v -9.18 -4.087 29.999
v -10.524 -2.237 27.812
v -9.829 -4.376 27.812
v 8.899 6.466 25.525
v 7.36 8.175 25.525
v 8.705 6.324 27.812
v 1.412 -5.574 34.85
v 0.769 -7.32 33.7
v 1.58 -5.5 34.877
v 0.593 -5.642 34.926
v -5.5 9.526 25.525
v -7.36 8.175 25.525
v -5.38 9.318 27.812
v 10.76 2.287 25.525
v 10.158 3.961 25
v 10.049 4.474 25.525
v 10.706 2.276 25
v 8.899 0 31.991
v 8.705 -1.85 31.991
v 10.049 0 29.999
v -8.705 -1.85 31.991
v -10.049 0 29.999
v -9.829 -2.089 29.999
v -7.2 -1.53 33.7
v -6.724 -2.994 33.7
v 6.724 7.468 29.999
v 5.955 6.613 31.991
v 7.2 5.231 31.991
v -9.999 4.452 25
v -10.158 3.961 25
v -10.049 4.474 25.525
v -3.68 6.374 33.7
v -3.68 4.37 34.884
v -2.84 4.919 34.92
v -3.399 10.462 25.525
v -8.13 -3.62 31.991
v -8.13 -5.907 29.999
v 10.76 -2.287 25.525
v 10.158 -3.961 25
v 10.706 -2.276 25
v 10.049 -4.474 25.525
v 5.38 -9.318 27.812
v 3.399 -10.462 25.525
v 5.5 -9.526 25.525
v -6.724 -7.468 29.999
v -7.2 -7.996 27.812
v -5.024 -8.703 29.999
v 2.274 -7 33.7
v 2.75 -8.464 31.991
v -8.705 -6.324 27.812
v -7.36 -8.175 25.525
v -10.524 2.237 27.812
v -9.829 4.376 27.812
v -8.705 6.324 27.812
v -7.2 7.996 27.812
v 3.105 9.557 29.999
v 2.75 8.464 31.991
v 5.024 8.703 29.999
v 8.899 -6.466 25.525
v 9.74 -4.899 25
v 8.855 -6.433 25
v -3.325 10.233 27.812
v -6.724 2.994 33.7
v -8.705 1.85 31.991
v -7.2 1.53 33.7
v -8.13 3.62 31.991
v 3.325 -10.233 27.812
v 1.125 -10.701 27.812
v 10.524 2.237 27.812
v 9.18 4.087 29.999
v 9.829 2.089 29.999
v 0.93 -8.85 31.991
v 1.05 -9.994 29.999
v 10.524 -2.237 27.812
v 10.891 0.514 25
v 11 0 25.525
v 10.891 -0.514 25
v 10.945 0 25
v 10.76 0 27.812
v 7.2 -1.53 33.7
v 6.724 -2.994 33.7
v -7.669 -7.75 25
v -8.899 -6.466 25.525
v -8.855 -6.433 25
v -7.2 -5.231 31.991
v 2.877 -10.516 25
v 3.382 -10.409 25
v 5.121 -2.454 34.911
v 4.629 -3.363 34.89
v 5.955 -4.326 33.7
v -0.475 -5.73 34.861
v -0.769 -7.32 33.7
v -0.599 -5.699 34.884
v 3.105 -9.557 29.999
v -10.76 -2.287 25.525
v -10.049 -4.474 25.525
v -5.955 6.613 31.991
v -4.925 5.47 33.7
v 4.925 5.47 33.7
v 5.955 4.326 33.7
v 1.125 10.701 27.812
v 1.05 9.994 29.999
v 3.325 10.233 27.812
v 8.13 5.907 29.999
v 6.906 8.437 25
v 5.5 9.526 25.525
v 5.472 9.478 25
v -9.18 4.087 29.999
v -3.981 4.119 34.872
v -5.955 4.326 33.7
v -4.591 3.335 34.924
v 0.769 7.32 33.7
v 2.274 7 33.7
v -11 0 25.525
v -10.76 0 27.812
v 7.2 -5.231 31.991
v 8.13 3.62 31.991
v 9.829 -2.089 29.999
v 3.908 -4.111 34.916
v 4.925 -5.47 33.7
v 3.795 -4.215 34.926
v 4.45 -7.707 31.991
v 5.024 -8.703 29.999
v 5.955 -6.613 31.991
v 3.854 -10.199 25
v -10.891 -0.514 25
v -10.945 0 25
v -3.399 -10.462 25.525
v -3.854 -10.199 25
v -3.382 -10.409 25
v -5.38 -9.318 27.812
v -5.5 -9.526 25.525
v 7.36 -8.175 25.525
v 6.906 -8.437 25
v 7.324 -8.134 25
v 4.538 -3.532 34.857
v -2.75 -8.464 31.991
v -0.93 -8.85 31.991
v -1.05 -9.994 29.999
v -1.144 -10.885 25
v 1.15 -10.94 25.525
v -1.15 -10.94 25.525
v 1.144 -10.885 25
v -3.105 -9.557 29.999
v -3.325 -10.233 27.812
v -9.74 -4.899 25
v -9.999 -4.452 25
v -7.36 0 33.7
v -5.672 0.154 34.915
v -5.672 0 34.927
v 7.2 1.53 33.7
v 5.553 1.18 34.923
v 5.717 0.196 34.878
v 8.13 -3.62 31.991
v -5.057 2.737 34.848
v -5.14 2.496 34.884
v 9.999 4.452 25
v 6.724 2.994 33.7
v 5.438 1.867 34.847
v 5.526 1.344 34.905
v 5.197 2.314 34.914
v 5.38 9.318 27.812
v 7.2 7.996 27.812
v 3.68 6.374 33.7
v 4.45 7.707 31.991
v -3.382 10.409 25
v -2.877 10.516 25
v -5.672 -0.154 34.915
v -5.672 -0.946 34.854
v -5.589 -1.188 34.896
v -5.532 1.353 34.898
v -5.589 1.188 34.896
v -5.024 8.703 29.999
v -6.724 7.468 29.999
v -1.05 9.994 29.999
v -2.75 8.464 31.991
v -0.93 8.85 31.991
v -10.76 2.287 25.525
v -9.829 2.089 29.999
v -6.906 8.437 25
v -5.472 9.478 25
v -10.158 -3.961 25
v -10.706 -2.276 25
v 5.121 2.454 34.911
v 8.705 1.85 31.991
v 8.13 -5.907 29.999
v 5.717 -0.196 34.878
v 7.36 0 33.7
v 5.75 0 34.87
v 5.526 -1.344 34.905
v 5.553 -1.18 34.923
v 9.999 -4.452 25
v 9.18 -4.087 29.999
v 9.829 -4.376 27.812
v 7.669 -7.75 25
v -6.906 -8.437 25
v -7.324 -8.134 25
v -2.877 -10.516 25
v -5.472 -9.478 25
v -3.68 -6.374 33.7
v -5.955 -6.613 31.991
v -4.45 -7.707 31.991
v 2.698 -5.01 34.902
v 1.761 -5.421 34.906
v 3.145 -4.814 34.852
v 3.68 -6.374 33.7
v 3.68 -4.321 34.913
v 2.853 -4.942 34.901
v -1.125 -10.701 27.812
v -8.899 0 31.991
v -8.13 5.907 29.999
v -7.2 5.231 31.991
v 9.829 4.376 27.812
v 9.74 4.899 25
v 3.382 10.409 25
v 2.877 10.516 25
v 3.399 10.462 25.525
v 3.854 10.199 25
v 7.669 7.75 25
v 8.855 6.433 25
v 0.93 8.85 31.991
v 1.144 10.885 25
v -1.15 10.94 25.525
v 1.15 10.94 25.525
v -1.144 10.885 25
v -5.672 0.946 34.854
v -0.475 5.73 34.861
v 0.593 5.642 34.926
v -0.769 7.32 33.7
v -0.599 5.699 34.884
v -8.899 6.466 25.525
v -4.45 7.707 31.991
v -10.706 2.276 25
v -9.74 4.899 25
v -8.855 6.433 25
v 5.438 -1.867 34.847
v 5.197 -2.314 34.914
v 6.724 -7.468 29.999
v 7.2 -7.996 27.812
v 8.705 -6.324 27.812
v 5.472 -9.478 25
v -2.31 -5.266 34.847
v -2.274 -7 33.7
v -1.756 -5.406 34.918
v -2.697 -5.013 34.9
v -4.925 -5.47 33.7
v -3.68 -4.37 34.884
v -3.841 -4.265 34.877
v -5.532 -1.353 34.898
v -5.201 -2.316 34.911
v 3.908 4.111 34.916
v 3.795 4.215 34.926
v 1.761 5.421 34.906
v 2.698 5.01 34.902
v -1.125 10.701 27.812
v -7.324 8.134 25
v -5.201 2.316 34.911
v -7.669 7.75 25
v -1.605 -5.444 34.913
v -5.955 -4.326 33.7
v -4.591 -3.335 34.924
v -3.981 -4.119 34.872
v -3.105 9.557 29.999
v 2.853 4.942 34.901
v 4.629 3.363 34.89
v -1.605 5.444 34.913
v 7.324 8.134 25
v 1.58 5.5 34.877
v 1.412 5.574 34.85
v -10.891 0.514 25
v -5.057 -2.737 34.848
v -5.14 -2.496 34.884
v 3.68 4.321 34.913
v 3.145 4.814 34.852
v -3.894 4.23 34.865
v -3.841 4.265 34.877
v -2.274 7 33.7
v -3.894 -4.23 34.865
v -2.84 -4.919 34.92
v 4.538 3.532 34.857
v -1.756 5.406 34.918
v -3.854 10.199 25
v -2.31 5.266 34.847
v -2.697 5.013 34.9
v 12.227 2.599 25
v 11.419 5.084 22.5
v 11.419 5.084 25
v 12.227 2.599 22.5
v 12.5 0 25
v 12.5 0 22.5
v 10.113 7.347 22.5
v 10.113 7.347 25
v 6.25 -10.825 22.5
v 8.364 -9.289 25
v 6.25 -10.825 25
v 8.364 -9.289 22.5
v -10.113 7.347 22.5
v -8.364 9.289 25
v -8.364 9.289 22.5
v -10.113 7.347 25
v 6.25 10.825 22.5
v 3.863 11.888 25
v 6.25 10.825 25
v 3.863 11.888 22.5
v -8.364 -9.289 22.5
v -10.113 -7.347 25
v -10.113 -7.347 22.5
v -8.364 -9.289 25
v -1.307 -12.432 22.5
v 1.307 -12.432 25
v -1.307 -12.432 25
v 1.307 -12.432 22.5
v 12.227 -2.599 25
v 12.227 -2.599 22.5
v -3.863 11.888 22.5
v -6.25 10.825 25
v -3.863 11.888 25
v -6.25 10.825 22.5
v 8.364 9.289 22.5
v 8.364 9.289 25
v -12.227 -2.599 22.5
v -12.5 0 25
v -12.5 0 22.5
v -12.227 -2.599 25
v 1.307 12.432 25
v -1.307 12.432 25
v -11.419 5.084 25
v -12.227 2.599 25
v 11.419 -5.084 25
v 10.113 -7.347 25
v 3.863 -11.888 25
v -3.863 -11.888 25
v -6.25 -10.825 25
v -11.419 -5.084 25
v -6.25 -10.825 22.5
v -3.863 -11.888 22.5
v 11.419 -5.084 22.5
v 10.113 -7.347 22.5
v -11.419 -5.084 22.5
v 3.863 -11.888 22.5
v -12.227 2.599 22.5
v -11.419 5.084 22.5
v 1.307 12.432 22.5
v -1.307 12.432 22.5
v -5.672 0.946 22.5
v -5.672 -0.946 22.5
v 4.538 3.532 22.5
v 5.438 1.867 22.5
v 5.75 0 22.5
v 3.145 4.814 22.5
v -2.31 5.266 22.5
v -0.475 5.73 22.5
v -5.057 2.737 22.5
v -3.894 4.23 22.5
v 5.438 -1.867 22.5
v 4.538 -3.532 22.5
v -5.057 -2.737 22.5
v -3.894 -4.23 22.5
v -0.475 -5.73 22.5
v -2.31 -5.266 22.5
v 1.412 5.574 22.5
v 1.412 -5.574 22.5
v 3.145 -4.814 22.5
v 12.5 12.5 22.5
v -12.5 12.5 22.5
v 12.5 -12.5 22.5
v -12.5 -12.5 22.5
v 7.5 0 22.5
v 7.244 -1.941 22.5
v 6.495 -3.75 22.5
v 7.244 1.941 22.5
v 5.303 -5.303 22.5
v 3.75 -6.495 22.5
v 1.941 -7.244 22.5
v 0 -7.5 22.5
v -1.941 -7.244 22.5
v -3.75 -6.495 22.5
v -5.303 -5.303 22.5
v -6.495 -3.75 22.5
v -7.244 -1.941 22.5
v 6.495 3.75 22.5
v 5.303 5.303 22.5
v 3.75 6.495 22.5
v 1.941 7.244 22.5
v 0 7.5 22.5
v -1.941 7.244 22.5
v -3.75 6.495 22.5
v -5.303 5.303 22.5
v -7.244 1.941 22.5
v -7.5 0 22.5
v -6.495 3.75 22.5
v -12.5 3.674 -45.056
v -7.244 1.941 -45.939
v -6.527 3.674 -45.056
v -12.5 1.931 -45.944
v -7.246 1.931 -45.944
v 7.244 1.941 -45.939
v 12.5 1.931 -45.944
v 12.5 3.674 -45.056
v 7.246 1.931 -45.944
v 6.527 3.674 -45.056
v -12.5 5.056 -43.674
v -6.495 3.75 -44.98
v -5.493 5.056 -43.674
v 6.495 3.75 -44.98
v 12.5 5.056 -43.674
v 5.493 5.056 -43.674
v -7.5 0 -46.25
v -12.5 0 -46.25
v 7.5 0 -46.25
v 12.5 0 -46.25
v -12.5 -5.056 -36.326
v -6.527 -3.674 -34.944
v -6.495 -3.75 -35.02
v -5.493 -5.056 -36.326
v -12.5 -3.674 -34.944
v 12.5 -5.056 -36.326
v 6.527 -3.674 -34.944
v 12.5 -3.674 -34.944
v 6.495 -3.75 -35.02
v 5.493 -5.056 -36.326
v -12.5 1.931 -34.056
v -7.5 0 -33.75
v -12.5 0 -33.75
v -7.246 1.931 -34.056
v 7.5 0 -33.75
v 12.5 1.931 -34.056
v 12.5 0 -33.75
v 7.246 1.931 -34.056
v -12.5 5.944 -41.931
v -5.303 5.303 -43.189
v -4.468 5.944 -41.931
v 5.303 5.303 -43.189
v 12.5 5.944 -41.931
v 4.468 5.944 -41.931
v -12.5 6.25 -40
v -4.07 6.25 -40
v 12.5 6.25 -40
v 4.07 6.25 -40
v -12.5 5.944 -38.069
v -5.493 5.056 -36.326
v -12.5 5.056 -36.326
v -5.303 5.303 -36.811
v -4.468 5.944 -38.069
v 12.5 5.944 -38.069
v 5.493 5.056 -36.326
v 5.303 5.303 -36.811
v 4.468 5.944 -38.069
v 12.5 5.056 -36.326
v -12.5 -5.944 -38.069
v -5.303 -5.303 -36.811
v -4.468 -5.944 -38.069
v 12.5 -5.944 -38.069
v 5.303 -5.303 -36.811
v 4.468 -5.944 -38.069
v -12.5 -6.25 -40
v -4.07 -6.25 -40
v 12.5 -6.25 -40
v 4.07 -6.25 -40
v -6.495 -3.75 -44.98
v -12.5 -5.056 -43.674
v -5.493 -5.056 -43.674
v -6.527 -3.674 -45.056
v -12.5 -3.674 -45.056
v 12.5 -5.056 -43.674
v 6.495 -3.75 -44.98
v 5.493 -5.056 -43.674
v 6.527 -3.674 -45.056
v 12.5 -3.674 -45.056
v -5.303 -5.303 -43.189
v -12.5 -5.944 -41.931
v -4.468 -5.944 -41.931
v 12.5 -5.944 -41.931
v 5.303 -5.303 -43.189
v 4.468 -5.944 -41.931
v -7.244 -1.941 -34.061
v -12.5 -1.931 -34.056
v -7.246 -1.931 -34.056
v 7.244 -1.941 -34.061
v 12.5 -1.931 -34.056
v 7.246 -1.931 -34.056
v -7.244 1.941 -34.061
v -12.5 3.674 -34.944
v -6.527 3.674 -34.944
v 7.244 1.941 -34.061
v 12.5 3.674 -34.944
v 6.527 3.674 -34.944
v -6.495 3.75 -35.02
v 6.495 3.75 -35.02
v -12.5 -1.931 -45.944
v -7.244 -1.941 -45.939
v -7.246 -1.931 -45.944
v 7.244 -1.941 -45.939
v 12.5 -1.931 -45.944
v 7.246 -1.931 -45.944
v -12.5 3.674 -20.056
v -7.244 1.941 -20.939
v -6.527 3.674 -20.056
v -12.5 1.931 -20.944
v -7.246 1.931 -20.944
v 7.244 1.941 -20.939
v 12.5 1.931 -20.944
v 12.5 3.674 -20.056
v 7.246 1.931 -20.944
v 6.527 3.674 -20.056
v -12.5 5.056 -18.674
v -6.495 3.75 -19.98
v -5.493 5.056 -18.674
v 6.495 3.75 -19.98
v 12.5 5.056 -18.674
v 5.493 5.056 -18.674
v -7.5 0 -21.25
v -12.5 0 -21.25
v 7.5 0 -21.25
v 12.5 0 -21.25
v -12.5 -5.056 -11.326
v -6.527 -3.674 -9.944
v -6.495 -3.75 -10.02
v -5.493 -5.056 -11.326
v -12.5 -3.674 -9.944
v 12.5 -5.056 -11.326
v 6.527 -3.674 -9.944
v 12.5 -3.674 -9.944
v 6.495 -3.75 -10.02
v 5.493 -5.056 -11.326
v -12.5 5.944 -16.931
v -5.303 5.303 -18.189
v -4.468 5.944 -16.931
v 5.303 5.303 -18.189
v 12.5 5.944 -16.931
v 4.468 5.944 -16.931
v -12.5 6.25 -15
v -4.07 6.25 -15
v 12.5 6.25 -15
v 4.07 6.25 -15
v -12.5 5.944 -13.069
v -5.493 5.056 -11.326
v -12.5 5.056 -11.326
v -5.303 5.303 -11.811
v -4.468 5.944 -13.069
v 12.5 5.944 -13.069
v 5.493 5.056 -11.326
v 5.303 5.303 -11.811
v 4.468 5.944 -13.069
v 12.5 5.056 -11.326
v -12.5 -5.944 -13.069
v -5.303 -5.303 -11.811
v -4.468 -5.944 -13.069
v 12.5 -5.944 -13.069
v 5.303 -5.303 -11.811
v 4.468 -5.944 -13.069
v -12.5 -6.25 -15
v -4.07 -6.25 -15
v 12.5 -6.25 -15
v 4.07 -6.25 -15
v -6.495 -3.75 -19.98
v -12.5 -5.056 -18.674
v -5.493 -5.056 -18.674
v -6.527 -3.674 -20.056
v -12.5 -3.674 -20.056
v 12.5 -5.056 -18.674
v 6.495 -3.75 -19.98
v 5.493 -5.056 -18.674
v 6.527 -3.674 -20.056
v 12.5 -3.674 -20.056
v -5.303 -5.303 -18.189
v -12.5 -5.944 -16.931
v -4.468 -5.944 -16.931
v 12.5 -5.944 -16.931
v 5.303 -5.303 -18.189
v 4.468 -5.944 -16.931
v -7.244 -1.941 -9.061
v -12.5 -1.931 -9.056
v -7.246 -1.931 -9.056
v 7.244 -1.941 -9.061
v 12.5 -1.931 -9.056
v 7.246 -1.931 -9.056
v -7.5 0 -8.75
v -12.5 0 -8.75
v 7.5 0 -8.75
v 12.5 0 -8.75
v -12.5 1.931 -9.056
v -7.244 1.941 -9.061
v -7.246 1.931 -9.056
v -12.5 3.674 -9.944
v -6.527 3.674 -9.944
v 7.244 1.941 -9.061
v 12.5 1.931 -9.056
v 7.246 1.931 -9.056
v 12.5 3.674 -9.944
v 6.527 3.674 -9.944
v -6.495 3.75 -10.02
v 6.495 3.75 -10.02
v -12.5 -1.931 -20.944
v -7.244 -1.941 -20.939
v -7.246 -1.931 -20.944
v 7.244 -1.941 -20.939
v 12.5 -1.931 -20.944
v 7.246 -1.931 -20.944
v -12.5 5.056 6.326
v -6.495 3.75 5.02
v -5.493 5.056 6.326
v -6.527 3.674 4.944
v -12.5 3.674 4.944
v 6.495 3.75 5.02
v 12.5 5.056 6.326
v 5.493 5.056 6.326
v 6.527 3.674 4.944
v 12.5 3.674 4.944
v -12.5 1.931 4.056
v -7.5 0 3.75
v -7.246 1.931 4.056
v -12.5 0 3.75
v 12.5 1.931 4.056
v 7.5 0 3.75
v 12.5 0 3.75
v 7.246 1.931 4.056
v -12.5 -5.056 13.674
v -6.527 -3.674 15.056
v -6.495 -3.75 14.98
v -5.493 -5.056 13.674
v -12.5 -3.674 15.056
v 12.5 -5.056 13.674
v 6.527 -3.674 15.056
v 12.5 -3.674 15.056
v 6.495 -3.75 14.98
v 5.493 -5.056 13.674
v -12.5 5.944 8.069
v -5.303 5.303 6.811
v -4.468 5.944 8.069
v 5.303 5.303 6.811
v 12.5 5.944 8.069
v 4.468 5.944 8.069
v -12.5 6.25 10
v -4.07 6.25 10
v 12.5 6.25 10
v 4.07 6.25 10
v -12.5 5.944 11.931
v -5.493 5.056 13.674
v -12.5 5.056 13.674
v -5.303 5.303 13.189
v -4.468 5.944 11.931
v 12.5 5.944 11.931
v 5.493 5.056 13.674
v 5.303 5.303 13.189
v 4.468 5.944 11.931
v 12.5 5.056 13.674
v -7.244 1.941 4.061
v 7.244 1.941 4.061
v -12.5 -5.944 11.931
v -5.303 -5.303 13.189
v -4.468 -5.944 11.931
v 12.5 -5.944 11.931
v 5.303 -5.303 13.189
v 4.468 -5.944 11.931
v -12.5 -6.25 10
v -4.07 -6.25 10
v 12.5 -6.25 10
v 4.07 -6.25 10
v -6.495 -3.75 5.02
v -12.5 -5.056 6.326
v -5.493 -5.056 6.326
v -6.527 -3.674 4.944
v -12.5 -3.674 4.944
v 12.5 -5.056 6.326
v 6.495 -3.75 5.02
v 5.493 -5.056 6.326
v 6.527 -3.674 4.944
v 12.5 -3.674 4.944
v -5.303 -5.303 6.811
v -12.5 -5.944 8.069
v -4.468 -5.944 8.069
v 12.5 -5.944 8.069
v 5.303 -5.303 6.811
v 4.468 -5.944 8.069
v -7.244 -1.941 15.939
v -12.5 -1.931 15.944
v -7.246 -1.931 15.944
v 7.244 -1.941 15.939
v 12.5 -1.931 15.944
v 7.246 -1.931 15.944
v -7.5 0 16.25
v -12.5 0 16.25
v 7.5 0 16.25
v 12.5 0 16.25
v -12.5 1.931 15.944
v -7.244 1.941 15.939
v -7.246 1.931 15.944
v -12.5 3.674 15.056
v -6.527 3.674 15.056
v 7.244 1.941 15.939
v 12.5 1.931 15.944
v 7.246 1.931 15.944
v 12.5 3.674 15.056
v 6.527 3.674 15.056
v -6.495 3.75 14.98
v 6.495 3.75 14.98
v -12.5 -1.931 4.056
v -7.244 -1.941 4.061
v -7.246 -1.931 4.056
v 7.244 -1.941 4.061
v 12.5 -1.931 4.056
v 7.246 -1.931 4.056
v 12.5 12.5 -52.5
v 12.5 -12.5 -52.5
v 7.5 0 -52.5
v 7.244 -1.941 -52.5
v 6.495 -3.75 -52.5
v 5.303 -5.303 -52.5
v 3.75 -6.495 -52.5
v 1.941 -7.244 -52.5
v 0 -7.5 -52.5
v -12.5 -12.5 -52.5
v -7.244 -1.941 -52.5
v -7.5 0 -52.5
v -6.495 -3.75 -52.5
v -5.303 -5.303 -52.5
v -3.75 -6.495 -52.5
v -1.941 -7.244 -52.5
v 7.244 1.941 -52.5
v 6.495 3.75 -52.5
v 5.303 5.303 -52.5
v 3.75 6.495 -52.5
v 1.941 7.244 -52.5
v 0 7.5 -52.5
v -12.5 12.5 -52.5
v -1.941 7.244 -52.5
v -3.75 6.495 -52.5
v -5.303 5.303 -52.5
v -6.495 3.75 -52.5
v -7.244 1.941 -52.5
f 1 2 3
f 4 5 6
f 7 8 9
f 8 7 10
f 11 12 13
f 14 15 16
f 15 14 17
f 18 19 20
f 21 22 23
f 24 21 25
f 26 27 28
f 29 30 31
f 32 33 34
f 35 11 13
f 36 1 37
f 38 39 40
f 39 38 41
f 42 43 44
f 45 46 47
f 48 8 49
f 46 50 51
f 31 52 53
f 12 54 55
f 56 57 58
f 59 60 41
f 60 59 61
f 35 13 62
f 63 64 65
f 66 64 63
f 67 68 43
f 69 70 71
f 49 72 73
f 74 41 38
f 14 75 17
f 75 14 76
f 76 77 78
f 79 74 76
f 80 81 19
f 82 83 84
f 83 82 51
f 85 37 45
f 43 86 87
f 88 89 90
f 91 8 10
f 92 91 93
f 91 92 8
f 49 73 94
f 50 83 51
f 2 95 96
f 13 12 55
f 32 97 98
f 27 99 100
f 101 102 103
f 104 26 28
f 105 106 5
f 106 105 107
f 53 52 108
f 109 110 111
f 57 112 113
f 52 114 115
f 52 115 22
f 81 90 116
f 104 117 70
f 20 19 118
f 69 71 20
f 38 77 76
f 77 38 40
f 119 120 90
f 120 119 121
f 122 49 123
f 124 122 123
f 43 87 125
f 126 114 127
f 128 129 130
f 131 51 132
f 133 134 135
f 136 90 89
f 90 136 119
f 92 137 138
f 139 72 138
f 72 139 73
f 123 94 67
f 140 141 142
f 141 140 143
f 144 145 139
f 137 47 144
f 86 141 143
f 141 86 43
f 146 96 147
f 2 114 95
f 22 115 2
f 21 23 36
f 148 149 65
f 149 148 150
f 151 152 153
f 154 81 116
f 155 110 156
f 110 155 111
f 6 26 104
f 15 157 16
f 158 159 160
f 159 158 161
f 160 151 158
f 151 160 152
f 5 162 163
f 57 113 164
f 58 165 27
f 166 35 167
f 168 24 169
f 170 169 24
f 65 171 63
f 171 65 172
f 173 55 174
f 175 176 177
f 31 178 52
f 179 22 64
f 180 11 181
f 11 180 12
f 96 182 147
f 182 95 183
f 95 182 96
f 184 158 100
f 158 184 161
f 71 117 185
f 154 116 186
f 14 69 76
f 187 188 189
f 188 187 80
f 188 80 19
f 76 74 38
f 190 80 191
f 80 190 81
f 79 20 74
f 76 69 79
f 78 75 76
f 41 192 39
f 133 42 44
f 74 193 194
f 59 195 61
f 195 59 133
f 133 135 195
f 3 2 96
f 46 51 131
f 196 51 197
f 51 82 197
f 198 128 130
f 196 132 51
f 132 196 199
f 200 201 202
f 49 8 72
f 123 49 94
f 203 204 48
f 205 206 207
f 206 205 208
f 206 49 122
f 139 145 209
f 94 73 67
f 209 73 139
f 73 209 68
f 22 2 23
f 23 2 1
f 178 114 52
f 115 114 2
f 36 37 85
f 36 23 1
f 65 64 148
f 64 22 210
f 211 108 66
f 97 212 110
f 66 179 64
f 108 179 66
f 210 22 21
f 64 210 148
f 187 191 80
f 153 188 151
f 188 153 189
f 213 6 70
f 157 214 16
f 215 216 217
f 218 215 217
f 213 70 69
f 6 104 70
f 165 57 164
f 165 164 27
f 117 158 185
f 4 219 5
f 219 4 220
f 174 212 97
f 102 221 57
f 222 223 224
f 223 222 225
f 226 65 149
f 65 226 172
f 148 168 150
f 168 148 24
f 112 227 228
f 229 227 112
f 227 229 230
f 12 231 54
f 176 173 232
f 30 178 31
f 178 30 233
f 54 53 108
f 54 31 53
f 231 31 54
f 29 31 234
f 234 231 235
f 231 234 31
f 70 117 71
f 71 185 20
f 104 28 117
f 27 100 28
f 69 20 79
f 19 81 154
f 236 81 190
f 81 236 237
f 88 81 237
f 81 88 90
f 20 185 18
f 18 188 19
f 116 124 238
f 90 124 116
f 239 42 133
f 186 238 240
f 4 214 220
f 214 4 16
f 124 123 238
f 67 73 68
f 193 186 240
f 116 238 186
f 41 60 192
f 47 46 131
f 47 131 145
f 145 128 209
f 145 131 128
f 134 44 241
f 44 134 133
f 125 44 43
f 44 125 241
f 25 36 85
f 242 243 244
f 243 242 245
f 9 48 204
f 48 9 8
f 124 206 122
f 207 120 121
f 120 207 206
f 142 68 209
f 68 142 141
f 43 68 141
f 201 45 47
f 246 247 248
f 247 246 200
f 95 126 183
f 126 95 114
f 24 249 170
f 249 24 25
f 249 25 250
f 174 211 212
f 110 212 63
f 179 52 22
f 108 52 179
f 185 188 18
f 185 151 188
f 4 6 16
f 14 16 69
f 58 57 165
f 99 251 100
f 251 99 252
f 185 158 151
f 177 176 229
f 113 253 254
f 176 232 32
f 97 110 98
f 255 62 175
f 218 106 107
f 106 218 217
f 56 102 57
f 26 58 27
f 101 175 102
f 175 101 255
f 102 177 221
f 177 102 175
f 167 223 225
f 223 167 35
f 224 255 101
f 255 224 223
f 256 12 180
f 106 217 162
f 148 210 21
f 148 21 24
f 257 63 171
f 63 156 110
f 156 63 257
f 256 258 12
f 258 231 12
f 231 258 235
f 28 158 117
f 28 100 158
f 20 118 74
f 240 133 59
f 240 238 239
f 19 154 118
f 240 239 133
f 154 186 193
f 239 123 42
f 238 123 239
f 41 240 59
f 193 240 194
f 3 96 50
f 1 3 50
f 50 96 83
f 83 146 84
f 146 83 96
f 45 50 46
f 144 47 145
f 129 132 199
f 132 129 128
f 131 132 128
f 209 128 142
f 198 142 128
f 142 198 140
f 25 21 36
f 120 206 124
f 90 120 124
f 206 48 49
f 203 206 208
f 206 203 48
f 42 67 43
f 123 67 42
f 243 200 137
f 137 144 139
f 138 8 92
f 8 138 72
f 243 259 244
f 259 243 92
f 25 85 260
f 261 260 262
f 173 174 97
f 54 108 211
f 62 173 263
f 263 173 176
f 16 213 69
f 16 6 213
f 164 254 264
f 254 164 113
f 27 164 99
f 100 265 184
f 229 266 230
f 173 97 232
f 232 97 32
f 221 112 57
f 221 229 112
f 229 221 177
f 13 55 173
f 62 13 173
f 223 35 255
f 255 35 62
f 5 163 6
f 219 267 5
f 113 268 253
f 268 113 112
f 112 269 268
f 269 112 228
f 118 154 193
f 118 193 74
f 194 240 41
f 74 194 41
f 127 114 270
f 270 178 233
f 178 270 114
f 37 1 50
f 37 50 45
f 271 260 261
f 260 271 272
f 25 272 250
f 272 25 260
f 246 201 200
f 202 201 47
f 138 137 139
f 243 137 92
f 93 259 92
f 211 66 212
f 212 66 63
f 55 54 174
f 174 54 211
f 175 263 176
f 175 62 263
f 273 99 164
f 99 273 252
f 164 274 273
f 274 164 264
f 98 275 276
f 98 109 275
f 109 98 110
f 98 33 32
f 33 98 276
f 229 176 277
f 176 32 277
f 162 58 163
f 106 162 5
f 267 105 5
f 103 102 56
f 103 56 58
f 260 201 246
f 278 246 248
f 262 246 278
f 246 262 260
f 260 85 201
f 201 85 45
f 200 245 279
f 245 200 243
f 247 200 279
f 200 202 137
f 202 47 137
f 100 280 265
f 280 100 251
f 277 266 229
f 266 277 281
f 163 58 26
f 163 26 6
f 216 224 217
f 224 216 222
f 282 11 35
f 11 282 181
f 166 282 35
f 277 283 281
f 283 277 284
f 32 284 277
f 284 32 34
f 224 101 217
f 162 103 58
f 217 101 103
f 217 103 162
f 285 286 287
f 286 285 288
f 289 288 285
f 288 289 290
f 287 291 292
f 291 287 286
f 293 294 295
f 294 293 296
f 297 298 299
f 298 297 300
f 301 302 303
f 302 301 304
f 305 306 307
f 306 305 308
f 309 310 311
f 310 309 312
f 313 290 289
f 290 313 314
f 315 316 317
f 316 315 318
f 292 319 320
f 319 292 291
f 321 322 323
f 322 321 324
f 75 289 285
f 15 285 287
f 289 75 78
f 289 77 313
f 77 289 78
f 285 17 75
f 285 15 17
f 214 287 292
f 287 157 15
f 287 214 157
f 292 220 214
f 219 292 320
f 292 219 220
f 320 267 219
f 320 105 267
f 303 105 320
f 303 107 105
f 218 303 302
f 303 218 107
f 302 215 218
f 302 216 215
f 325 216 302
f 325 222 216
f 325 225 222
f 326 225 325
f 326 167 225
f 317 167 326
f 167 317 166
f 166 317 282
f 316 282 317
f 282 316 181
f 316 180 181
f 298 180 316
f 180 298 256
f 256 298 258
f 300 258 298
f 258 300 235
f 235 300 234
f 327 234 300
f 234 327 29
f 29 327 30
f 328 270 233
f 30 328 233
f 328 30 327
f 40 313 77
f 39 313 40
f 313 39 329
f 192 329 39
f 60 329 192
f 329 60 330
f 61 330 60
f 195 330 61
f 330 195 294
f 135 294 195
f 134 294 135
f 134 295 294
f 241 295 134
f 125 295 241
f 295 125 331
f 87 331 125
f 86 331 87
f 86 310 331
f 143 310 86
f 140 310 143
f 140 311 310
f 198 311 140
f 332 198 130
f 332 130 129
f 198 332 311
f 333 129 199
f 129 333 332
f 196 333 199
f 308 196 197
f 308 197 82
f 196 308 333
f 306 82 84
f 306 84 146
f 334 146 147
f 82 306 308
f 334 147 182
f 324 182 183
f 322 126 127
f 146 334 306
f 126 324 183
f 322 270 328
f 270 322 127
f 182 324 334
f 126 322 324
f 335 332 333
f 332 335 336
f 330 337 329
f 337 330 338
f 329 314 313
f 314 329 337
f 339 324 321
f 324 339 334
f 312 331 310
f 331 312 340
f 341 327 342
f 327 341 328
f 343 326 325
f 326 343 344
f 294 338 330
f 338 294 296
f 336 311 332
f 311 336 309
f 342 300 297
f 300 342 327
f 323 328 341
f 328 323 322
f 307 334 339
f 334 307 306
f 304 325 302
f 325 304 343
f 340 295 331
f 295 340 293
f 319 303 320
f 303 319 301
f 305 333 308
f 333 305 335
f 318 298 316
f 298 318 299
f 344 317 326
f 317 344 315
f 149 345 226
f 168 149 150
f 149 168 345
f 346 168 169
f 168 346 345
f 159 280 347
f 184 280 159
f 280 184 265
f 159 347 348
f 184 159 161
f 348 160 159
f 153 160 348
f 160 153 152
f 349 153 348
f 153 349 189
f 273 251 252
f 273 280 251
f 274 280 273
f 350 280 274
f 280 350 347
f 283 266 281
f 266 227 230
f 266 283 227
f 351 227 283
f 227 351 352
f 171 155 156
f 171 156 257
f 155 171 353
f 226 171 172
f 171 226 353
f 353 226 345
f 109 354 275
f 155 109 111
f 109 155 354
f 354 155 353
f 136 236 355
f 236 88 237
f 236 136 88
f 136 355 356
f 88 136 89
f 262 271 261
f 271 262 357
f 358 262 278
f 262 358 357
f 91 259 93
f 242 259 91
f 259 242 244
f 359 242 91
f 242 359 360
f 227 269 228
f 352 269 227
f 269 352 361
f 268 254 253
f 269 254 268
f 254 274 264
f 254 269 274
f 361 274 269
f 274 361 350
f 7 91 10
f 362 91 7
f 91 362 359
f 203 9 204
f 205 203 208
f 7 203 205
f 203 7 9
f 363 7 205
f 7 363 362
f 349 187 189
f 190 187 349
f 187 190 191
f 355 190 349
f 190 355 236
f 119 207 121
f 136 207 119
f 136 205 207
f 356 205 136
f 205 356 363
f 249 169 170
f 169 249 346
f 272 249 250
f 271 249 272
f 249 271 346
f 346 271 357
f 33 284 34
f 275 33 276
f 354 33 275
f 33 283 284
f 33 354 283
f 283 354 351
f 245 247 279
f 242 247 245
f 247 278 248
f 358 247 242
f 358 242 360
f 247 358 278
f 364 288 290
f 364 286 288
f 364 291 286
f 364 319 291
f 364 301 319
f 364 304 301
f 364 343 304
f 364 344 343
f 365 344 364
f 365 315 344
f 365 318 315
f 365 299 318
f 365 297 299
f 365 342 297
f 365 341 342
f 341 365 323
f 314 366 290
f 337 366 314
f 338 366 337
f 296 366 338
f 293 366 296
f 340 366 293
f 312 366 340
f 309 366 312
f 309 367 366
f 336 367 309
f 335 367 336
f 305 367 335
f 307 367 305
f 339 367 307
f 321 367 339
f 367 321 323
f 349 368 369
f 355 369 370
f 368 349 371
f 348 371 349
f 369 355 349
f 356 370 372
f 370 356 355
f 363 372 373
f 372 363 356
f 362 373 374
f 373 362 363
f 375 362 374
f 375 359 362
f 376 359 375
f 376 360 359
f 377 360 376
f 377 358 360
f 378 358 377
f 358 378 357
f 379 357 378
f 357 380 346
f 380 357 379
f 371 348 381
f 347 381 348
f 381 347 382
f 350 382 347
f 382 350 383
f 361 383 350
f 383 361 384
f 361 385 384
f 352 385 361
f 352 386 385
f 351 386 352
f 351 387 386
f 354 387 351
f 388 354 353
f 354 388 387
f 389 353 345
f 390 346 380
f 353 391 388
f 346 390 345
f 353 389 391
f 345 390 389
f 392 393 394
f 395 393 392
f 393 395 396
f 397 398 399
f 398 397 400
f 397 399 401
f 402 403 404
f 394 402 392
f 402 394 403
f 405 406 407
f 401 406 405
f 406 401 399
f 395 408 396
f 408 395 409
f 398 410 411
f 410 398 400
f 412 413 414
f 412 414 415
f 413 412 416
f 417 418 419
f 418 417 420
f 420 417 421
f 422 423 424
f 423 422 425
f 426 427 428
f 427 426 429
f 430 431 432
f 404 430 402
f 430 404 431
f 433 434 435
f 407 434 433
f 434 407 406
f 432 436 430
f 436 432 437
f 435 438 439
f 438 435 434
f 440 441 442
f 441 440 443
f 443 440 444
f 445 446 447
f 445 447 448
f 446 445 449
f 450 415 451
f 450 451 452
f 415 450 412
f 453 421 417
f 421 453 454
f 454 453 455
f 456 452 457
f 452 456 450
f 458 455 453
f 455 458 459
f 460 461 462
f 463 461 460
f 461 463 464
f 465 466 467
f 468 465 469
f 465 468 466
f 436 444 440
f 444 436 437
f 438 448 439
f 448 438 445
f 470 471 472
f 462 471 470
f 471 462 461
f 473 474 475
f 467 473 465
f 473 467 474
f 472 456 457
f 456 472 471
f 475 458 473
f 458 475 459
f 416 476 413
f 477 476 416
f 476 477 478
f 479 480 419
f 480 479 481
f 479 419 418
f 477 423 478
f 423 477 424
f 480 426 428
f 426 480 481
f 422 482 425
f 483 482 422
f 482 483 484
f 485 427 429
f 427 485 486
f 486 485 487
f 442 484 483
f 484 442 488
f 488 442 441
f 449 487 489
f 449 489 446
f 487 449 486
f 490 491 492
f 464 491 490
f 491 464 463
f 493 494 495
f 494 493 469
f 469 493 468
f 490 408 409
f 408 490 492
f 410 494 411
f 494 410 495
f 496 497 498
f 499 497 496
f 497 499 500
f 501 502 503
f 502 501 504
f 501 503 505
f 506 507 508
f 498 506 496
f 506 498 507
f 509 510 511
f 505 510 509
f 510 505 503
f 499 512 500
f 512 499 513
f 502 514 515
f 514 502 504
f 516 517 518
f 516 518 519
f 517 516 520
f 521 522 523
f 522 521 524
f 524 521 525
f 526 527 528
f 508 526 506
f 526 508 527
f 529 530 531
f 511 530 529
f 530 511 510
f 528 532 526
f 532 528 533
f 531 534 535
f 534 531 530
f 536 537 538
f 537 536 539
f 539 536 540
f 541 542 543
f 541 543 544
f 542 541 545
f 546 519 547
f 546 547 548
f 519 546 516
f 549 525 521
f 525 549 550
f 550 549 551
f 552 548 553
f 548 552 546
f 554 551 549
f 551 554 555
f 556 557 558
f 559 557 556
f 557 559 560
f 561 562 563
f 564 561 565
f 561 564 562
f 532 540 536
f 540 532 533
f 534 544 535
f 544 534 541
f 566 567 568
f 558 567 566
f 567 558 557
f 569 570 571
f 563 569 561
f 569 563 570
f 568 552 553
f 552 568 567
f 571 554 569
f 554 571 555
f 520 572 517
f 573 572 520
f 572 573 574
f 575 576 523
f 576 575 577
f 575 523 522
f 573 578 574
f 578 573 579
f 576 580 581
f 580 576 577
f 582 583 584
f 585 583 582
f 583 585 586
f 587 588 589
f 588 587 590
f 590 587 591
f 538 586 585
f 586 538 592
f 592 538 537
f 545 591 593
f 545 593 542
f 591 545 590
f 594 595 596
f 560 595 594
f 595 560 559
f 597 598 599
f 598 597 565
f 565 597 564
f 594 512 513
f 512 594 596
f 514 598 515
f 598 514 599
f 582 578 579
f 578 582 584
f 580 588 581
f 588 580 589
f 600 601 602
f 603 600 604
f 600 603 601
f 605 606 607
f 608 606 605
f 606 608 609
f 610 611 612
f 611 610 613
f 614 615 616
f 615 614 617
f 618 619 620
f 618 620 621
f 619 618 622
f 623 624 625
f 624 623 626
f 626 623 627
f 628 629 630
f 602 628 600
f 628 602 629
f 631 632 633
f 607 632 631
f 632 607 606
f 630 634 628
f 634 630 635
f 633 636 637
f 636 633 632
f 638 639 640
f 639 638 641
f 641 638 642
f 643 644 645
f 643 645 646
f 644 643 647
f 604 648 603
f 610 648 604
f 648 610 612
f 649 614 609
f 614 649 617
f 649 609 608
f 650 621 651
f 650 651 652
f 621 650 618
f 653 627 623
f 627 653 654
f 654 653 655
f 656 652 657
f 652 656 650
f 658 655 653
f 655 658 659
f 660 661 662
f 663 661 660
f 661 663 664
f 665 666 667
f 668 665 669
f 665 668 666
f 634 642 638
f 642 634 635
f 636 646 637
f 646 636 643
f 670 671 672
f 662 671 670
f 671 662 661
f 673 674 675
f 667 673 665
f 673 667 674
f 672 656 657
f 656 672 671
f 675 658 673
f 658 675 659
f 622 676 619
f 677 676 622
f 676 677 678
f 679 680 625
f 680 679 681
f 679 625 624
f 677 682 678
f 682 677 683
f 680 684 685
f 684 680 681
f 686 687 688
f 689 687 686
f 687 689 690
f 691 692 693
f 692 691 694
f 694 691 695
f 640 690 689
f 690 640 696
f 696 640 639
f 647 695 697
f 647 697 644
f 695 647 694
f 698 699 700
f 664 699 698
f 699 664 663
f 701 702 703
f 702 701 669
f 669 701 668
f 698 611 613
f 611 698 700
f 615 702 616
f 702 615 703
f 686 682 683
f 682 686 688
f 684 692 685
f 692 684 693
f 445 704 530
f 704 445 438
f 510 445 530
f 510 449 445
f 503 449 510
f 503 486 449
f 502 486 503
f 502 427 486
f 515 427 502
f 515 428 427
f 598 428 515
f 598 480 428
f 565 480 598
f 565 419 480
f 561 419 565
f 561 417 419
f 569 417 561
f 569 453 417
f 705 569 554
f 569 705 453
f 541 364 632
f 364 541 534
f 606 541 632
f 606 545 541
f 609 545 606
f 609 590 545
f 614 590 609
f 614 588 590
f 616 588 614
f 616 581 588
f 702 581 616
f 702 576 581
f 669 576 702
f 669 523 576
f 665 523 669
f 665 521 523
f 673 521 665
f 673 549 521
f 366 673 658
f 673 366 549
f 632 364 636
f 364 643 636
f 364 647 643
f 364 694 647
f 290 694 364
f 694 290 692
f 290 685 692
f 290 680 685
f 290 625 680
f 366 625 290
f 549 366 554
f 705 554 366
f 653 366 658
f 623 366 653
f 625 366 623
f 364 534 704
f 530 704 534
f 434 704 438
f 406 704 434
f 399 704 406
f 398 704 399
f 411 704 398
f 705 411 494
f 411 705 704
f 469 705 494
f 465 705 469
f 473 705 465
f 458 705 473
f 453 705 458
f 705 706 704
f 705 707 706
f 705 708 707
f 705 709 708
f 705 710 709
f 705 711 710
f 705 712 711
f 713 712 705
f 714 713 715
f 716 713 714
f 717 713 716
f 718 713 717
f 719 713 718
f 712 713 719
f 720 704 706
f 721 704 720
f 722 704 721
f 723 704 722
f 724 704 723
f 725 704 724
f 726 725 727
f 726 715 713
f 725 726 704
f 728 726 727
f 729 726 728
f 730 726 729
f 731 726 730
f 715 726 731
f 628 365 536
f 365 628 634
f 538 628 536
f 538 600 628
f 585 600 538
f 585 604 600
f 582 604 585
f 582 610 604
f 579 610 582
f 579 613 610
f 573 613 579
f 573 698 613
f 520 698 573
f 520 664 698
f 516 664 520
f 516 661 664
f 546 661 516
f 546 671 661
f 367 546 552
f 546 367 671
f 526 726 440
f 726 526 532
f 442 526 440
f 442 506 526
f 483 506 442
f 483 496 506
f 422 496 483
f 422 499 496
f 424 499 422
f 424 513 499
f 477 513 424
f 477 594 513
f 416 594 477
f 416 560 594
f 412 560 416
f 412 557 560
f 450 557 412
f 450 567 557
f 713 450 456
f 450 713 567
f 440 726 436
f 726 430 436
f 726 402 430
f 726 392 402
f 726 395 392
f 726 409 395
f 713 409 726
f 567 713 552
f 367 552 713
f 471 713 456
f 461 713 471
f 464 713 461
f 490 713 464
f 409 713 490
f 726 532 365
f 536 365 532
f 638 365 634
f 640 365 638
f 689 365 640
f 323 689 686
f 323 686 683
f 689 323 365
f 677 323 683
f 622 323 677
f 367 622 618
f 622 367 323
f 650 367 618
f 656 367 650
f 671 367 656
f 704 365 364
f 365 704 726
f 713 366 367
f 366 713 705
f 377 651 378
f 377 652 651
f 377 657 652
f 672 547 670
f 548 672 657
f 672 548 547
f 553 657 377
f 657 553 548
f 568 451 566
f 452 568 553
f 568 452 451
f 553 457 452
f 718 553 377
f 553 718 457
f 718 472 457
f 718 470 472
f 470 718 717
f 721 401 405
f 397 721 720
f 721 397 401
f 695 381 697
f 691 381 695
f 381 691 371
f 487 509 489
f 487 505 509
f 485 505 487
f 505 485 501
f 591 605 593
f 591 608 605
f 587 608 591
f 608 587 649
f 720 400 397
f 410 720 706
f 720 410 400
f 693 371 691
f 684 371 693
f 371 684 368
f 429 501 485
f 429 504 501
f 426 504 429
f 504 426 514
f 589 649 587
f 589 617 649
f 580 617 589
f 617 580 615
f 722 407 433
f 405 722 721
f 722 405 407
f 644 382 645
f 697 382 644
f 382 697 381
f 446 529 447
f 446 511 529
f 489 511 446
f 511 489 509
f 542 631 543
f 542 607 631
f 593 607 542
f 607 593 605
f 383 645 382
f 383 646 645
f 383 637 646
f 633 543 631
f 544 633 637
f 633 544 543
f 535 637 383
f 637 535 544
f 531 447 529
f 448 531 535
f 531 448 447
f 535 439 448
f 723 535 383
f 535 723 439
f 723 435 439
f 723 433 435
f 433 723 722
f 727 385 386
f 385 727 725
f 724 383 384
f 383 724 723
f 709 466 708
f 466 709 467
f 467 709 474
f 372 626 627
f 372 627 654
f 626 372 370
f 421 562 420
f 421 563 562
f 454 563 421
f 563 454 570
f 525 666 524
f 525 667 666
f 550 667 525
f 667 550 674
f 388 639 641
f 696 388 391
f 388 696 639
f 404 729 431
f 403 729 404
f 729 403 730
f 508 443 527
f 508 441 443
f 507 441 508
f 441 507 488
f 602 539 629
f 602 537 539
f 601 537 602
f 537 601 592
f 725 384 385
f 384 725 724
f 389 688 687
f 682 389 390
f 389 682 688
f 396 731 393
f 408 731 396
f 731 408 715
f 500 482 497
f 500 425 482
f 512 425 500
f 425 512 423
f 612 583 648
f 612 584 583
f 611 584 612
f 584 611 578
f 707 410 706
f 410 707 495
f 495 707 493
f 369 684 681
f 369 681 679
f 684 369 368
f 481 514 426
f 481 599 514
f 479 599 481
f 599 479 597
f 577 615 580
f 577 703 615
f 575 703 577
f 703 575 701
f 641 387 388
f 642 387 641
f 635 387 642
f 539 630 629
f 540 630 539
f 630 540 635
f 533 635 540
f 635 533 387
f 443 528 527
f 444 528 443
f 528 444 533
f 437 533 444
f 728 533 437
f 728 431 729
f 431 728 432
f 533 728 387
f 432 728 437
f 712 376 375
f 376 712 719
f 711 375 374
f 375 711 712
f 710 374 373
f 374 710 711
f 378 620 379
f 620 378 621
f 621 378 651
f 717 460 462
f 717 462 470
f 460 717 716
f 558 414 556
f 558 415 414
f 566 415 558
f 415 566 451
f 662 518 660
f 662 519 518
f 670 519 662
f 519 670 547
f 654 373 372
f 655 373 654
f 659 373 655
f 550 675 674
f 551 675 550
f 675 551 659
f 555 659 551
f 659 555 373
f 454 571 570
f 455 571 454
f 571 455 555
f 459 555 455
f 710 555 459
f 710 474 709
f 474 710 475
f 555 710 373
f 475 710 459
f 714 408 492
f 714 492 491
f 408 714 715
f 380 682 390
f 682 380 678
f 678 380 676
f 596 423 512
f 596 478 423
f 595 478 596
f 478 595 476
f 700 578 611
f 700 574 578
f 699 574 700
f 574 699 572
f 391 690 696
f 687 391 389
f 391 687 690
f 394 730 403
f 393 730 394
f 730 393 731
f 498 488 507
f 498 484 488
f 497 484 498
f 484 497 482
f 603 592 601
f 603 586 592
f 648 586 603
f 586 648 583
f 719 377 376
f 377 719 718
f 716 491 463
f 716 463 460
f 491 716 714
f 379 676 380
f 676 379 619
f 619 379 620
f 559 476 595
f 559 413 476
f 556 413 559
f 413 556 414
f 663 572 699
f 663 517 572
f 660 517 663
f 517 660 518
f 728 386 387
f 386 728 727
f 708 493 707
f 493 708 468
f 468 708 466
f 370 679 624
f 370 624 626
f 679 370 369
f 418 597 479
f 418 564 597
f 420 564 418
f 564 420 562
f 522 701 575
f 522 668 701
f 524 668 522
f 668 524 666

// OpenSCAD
// file: link.scad
//difference(){
link(25,25);
//translate([-25,0,0])cube([50,50,50]);
//}

module link(
	od=25, //outer diameter
	height=25 //height cylindrical part of link
	) {

	ballr=(od/2)*0.88; //radius of ball on top
	sr=od*.23; //string radius

	difference() {
		outside();
		inside();
	}

	//showinside();
	module showinside() {
		translate([1.1*od,0,0])
			inside();
	}
	
	module outside () {
		translate([0,0,od*.021+height])
			sphere( r = ballr);
		cylinder(h = height, r = 1*od/2);
	}
	
	module inside() {
		cylinder(h = (.5*od), r = 0.8*ballr);
		translate([0,0,(.5*od)])
			cylinder(h = ballr+od*.1+height-0.5*od, r1 = 0.8*ballr, r2 = 0);
		translate([0,0,((ballr+od*.1+height-0.5*od)-((ballr+od*.1+height-0.5*od)/(0.8*ballr))*sr)+(.5*od)]) //height of cone - (string radius * height of cone / radius of cone) + distance cone was translated
			cylinder(h=height+od, r=sr);
		translate([0,0,ballr*-.36])
		sphere(r=ballr*1);
	}
}
// main file
use<link.scad>
od = 25;
height = 25;

difference(){
link(od,height);
translate([-(.5*od),-(.5*od),-2.1*height])cube([od,od,od*3]);
}

translate([-(.5*od),-(.5*od),-2.1*height]) screwblock();
module screwblock() {
	difference() {	
		cube([od,od,od*3]);
		translate([(-1),(.5*od),height/2]) 
			holes();
		
		translate([od/2,od/2,0]) cylinder(r=od*.3,h=height*3);
	}


	module holes() {
		for(z=[0:2]) {
			translate([0,0,z*height]) rotate([0,90,0]) cylinder(h=od*2, r=od*.25);
		}
	}

}
		
